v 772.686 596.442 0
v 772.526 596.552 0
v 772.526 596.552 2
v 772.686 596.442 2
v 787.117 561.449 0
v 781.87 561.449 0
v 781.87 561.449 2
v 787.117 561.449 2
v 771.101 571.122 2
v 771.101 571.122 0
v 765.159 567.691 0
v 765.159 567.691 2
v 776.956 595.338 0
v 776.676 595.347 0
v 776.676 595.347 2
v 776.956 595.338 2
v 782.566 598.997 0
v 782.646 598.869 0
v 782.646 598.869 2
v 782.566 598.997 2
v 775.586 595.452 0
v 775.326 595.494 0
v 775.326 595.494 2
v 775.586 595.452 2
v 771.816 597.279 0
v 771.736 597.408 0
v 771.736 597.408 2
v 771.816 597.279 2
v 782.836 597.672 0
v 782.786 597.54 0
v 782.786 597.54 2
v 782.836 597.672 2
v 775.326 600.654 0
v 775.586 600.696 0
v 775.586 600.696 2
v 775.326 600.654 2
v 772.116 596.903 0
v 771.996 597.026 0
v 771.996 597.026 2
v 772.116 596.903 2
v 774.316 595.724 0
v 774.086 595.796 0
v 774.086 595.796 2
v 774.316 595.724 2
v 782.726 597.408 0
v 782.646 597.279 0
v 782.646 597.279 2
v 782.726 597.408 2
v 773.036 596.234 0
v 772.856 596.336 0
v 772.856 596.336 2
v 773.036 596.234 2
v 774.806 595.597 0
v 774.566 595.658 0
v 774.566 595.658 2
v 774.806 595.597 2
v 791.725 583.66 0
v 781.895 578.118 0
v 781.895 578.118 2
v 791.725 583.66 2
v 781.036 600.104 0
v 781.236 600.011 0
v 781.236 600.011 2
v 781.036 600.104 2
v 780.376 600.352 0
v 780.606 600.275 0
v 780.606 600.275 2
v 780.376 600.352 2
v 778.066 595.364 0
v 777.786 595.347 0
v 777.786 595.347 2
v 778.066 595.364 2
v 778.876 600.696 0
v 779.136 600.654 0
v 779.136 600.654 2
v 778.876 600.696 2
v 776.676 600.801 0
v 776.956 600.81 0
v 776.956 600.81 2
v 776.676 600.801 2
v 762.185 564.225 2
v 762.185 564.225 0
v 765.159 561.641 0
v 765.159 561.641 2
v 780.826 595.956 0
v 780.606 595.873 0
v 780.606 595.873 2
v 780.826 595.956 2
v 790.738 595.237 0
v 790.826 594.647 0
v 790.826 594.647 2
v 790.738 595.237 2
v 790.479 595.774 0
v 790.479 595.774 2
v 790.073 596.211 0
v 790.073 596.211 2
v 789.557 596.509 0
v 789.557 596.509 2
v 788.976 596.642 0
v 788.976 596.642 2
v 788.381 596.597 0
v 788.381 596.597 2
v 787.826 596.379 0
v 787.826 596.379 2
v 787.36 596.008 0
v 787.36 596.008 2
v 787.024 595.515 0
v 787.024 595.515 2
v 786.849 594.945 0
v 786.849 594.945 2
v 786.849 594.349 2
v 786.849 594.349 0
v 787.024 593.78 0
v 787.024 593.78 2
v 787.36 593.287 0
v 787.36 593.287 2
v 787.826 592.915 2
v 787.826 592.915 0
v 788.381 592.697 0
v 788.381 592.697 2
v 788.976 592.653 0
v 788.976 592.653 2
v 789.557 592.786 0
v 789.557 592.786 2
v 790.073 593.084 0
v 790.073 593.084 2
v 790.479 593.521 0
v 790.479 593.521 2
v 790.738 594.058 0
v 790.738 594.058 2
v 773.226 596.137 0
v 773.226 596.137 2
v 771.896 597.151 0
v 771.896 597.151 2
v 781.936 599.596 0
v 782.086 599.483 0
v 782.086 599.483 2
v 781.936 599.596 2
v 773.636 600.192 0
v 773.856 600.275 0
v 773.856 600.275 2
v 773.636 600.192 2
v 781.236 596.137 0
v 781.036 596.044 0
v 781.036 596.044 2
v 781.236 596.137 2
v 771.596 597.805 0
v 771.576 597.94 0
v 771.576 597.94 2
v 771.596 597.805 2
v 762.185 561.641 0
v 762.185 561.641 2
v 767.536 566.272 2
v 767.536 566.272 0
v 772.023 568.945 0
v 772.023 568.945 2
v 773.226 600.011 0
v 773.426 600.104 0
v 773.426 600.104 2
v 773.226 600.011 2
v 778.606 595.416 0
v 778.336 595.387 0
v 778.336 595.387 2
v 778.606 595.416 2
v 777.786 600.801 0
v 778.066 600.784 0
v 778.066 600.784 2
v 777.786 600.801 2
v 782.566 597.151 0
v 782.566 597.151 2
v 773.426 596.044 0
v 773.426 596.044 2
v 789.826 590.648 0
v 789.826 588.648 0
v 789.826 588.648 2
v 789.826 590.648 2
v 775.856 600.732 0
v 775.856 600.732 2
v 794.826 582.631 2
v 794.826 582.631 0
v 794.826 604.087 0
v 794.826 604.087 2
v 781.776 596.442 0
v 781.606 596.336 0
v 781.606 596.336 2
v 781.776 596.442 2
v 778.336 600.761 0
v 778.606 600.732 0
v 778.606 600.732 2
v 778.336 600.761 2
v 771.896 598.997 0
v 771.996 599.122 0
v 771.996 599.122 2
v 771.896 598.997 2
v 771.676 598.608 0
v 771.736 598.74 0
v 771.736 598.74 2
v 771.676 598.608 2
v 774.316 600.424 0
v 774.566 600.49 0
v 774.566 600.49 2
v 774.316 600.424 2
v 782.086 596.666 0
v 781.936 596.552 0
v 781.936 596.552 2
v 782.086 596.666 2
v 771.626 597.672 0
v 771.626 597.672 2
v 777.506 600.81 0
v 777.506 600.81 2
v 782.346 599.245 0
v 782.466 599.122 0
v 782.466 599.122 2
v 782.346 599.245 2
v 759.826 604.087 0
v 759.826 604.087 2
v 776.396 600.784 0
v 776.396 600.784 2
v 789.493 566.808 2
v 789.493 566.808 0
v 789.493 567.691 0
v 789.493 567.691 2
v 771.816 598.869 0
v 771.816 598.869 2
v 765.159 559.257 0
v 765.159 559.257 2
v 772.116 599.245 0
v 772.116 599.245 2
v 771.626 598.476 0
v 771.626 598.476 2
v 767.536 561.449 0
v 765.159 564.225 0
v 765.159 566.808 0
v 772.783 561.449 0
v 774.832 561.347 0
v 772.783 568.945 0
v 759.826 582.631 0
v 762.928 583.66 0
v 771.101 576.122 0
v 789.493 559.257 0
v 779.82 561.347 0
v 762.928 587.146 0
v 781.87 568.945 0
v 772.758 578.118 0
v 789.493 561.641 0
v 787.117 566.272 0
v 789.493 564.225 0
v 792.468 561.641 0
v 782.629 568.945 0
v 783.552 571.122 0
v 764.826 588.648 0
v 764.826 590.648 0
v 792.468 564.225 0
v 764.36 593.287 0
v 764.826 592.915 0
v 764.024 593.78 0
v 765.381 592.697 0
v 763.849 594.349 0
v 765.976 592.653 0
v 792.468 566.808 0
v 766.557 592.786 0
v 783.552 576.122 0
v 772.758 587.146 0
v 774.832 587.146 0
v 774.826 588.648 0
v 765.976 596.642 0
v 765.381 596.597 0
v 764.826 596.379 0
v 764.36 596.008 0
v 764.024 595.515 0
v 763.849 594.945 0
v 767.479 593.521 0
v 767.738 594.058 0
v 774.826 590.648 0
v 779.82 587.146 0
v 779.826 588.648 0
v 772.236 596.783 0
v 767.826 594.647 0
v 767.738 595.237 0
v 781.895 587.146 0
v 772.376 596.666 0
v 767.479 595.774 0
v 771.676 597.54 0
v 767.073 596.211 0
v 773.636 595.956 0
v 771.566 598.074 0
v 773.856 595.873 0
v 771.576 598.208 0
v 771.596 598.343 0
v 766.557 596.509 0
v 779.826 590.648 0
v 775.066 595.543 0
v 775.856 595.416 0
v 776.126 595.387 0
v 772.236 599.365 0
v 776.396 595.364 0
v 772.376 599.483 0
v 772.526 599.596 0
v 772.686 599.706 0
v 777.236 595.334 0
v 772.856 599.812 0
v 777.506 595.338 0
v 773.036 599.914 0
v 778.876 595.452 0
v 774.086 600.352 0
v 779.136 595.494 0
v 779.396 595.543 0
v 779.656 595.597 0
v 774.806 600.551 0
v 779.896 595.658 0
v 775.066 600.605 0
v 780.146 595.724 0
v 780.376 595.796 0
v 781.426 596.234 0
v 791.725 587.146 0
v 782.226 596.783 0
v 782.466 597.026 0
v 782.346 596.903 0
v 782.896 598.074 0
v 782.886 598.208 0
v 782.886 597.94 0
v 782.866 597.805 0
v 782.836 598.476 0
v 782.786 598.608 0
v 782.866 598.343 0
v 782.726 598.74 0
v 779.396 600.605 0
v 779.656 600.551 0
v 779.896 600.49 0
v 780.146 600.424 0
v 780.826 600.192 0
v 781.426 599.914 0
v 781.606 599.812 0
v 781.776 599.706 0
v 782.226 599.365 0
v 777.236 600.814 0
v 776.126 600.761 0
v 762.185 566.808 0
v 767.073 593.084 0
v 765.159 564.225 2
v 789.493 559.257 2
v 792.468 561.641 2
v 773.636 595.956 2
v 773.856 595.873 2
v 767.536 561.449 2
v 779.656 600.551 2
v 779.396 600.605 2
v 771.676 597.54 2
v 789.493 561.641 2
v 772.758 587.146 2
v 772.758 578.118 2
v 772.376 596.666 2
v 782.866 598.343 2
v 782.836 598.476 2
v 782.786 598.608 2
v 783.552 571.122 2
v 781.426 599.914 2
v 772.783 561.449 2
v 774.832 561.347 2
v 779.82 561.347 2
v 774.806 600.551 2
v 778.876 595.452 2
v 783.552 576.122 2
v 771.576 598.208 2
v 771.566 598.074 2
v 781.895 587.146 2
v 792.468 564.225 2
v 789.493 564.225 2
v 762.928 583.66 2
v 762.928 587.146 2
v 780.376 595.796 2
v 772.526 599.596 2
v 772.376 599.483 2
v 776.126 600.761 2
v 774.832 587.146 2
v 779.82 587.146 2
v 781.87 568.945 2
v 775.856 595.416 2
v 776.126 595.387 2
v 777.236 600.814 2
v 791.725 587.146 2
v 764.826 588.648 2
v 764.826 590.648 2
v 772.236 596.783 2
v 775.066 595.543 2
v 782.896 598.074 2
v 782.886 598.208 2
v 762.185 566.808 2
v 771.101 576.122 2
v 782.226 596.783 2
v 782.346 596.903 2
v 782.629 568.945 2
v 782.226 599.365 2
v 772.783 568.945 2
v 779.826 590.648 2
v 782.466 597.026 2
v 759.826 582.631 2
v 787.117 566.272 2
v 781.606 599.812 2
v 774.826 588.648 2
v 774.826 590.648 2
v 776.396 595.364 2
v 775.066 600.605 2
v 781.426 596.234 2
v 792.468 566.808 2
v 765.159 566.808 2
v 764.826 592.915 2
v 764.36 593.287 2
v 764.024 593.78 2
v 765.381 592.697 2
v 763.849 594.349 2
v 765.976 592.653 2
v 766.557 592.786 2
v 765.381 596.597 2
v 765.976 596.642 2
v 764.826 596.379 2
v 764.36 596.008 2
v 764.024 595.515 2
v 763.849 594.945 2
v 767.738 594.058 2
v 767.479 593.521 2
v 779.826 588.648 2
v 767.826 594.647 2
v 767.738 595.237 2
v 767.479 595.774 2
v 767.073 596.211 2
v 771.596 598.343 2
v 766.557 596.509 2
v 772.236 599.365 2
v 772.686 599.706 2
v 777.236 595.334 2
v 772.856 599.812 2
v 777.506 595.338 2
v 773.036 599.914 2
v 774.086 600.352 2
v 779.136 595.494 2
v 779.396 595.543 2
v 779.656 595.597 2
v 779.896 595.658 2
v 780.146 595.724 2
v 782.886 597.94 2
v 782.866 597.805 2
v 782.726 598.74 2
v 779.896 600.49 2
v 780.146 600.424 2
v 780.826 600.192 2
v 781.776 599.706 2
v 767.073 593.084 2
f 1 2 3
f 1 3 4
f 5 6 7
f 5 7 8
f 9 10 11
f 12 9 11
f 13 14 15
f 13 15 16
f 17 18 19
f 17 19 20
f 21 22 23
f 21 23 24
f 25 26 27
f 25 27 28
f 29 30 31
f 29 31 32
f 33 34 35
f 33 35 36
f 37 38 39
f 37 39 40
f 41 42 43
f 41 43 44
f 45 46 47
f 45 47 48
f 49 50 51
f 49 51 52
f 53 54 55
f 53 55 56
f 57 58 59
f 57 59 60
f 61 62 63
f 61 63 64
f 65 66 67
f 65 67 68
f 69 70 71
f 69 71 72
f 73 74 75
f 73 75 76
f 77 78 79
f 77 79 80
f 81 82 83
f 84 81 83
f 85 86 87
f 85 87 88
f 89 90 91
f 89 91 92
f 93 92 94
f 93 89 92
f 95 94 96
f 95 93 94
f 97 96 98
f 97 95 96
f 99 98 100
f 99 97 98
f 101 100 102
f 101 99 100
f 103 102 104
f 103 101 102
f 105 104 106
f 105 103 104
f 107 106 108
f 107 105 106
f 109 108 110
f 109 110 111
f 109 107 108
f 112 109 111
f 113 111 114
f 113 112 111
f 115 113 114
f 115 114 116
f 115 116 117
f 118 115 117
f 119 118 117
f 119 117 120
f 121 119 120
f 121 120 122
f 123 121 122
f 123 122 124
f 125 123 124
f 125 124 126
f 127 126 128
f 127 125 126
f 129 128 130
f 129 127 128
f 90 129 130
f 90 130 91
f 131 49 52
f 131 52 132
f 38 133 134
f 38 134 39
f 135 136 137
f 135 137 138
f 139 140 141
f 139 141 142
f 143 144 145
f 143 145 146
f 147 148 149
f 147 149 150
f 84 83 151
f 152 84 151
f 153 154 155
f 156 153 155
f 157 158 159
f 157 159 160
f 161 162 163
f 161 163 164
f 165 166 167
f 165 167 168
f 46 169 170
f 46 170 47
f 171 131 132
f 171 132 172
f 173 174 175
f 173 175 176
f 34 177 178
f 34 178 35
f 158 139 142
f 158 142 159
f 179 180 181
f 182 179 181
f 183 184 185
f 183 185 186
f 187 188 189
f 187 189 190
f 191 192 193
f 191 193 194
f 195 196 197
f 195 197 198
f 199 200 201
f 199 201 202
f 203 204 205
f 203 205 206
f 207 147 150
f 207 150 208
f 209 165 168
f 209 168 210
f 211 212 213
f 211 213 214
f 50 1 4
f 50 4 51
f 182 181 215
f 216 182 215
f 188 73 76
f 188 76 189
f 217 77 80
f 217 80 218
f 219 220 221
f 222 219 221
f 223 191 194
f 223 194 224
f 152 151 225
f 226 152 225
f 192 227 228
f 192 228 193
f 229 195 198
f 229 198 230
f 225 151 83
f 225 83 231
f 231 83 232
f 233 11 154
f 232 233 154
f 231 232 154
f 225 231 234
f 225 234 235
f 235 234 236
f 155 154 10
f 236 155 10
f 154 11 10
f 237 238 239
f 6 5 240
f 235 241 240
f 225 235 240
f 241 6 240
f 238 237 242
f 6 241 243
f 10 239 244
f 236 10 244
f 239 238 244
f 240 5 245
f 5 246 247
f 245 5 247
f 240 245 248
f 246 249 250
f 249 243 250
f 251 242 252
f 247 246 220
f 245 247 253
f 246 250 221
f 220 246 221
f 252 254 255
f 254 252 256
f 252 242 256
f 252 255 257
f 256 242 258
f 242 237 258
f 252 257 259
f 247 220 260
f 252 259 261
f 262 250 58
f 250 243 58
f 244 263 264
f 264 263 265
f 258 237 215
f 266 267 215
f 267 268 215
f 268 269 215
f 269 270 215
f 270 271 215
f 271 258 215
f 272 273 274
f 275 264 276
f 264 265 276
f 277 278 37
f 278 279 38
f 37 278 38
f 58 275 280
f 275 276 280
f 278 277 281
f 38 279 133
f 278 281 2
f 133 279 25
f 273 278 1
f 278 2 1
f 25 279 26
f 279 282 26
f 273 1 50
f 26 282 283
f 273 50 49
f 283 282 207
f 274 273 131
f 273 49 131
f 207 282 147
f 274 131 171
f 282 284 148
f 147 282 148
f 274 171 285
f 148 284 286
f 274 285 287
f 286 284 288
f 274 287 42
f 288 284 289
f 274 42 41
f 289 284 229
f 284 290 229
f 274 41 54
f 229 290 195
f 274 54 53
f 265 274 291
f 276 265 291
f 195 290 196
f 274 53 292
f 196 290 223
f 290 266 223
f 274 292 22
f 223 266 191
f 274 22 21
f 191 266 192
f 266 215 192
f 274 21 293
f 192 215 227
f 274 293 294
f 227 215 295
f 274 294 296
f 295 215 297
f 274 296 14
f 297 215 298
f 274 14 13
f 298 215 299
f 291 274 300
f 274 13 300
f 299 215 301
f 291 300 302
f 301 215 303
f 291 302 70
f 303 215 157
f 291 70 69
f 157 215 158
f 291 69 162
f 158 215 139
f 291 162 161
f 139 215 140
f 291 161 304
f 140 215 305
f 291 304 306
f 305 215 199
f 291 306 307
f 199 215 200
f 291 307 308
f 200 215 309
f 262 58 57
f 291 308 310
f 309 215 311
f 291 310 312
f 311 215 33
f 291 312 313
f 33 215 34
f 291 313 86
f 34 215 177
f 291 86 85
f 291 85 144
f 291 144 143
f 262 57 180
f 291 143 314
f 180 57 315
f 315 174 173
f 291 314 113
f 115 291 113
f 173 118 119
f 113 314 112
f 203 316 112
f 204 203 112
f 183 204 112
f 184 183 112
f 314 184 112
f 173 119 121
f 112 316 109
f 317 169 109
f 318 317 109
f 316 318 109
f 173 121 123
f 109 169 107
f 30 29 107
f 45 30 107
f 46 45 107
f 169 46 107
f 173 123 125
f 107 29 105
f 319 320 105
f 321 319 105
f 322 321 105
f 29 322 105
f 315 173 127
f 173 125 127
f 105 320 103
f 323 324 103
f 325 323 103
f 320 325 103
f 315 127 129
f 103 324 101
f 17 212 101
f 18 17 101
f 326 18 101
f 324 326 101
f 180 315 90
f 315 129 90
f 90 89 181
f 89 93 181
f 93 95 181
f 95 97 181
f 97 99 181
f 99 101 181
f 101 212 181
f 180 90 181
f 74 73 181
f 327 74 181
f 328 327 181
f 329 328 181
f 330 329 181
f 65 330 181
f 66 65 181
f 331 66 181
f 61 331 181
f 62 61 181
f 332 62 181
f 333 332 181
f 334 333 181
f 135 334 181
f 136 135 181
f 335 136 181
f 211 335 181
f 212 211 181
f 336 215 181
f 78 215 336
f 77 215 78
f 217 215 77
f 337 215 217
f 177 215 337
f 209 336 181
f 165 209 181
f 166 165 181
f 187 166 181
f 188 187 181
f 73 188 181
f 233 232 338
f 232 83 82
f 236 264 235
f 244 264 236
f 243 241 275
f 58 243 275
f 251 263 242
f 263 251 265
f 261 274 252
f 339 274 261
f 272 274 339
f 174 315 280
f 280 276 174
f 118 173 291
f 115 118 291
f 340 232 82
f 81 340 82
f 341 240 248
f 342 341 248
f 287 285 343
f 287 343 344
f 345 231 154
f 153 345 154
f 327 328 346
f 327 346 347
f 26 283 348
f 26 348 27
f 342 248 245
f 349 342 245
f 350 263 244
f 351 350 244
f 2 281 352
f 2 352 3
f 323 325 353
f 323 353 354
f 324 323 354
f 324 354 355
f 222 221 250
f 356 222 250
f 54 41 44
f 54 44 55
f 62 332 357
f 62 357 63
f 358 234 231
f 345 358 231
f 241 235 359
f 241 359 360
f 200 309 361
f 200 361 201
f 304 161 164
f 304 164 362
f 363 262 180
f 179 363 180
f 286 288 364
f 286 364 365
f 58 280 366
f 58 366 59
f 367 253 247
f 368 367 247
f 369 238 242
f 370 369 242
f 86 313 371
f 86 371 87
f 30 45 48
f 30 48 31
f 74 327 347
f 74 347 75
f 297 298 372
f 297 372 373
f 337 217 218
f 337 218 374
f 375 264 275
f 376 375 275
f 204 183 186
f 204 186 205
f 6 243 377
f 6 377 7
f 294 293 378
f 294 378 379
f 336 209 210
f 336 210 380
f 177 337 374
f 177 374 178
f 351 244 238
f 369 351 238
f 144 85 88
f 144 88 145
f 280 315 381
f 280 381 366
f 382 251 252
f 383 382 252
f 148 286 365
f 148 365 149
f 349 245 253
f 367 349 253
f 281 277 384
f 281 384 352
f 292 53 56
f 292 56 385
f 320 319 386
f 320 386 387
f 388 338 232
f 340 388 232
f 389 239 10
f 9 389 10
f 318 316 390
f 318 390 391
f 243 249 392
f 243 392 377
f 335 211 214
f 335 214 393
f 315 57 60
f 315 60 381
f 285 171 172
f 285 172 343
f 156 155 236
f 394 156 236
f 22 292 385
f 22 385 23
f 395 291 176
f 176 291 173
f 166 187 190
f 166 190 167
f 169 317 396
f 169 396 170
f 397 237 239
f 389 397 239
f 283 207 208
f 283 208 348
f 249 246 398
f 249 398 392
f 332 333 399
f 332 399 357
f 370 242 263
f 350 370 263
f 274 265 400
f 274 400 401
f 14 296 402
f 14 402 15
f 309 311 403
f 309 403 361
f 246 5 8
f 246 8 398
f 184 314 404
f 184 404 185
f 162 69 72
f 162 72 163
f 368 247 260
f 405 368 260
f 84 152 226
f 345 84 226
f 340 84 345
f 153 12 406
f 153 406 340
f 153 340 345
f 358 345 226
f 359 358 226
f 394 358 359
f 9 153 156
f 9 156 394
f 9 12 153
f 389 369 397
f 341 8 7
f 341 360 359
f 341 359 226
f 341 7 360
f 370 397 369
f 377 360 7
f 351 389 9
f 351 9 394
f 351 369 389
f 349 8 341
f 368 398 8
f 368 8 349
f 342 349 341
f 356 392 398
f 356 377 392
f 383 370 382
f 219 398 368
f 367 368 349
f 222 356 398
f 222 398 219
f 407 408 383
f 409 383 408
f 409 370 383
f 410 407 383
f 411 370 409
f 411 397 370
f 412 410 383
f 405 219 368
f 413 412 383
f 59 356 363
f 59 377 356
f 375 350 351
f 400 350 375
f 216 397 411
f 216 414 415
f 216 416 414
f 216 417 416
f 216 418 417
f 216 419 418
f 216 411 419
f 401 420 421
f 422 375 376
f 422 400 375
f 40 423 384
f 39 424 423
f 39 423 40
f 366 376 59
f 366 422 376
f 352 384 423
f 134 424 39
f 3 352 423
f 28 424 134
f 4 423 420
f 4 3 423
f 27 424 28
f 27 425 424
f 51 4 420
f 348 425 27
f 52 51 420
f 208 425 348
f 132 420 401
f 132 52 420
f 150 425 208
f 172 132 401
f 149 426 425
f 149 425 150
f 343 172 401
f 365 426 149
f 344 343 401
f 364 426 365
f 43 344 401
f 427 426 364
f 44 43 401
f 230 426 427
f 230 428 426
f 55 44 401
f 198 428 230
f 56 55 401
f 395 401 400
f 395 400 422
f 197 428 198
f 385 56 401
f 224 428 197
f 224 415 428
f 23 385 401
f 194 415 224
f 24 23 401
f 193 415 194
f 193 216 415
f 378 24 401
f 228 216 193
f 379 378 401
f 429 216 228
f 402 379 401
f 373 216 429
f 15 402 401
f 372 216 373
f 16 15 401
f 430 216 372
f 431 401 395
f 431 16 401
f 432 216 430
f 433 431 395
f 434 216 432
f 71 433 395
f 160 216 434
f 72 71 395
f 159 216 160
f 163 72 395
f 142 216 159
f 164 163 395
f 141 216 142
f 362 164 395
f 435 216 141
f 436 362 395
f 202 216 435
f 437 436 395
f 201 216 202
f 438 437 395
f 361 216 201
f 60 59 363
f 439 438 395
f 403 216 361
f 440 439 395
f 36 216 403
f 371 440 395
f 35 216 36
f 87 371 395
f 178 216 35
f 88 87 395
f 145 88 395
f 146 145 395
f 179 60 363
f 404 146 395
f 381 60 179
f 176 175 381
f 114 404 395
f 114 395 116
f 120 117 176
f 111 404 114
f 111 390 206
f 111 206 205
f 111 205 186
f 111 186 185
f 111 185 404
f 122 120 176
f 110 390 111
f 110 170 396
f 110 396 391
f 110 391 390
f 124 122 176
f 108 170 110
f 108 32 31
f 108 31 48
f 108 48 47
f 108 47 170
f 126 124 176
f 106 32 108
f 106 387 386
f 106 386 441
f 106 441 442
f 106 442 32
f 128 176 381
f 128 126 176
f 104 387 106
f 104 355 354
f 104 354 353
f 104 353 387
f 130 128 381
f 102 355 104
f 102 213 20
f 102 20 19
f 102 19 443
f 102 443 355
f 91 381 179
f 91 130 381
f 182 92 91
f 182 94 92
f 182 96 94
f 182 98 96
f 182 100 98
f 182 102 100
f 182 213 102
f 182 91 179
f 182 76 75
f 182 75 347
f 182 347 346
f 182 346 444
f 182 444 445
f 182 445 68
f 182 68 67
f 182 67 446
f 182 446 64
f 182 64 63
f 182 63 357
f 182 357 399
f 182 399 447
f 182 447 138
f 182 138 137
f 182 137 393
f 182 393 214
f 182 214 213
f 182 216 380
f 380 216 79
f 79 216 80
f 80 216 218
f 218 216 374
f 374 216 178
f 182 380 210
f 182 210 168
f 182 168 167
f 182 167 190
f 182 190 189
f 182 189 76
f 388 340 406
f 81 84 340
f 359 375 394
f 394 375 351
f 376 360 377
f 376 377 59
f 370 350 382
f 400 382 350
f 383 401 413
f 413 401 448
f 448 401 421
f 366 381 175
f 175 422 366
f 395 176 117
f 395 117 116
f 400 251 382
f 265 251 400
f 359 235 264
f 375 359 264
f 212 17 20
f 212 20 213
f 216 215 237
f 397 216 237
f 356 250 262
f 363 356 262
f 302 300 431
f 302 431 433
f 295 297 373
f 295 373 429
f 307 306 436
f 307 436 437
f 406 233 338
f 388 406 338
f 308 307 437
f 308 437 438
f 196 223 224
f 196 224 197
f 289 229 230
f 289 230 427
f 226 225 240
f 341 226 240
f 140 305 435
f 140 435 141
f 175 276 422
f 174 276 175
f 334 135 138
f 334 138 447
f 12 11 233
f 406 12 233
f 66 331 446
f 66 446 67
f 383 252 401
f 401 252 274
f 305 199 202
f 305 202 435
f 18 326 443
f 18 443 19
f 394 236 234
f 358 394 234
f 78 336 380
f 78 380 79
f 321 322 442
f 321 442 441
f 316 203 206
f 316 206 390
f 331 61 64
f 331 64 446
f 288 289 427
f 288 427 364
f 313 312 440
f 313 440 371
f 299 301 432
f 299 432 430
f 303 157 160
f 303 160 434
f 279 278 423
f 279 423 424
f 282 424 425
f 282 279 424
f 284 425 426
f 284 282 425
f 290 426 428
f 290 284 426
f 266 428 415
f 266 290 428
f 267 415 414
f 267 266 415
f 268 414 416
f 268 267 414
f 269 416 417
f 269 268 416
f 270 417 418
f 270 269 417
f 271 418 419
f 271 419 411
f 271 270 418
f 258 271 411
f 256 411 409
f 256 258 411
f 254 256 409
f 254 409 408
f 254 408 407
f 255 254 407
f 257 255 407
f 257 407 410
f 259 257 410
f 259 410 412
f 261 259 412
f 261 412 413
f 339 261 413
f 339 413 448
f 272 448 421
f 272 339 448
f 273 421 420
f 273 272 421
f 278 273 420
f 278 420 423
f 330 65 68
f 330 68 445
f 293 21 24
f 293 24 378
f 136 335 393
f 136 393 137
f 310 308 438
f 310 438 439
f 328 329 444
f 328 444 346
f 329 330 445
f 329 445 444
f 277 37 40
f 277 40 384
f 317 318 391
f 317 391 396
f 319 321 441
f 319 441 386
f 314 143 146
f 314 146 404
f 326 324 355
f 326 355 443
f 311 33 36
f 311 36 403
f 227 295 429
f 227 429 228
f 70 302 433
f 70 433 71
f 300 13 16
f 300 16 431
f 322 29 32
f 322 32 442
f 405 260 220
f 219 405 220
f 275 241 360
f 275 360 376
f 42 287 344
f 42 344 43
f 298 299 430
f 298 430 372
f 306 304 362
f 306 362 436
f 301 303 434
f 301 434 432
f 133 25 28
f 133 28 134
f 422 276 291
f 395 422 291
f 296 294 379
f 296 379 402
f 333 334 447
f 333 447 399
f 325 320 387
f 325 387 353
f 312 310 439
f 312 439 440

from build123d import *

# Parameters (mm, degrees)
MODEL_R         = 2
MODEL_W         = 10
MODEL_H         = 2
MODEL_W_2       = 4.987831099
MODEL_H_2       = 25.799348384
EXTRUDE_1_DEPTH = 2


with BuildPart() as part:
    # Model → 凸台-拉伸1 (new body)
    with BuildSketch(Plane.XY):
        Polygon((794.826364885, 604.086609439), (759.826364885, 604.086609439), (759.826364885, 582.631162925), (771.100956458, 576.121774445), (771.100956458, 571.121774445), (765.159330178, 567.691374913), (765.159330178, 566.808009524), (762.184594735, 566.808009524), (765.159330178, 564.224720814), (762.184594735, 564.224720814), (765.159330178, 561.641432105), (762.184594735, 561.641432105), (765.159330178, 559.256659904), (789.493399591, 559.256659904), (792.468135034, 561.641432105), (789.493399591, 561.641432105), (792.468135034, 564.224720814), (789.493399591, 564.224720814), (792.468135034, 566.808009524), (789.493399591, 566.808009524), (789.493399591, 567.691374913), (783.551773312, 571.121774445), (783.551773312, 576.121774445), (794.826364885, 582.631162925), align=None)
        with Locations((765.826364885, 594.647306527)):
            Circle(MODEL_R, mode=Mode.SUBTRACT)
        with Locations((788.826364885, 594.647306527)):
            Circle(MODEL_R, mode=Mode.SUBTRACT)
        with Locations((784.826364885, 589.647718545)):
            Rectangle(MODEL_W, MODEL_H, mode=Mode.SUBTRACT)
        with Locations((769.826364885, 589.647718545)):
            Rectangle(MODEL_W, MODEL_H, mode=Mode.SUBTRACT)
        Polygon((791.725011171, 587.146217285), (781.894706262, 587.146217285), (781.894706262, 578.118128773), (791.725011171, 583.659501515), align=None, mode=Mode.SUBTRACT)
        with Locations((777.326364885, 574.246543093)):
            Rectangle(MODEL_W_2, MODEL_H_2, mode=Mode.SUBTRACT)
        Polygon((787.11688102, 566.27157462), (782.629496351, 568.945406022), (781.869533608, 568.945406022), (781.869533608, 561.448894487), (787.11688102, 561.448894487), align=None, mode=Mode.SUBTRACT)
        Polygon((762.927718599, 587.146217285), (772.758023508, 587.146217285), (772.758023508, 578.118128773), (762.927718599, 583.659501515), align=None, mode=Mode.SUBTRACT)
        Polygon((767.53584875, 566.27157462), (772.023233419, 568.945406022), (772.783196161, 568.945406022), (772.783196161, 561.448894487), (767.53584875, 561.448894487), align=None, mode=Mode.SUBTRACT)
        Polygon((782.896259254, 598.074237023), (782.886259254, 598.208237023), (782.866259254, 598.343237023), (782.836259254, 598.476237023), (782.786259254, 598.608237023), (782.726259254, 598.740237023), (782.646259254, 598.869237023), (782.566259254, 598.997237023), (782.466259254, 599.122237023), (782.346259254, 599.245237023), (782.226259254, 599.365237023), (782.086259254, 599.483237023), (781.936259254, 599.596237023), (781.776259254, 599.706237023), (781.606259254, 599.812237023), (781.426259254, 599.914237023), (781.236259254, 600.011237023), (781.036259254, 600.104237023), (780.826259254, 600.192237023), (780.606259254, 600.275237023), (780.376259254, 600.352237023), (780.146259254, 600.424237023), (779.896259254, 600.490237023), (779.656259254, 600.551237023), (779.396259254, 600.605237023), (779.136259254, 600.654237023), (778.876259254, 600.696237023), (778.606259254, 600.732237023), (778.336259254, 600.761237023), (778.066259254, 600.784237023), (777.786259254, 600.801237023), (777.506259254, 600.810237023), (777.236259254, 600.814237023), (776.956259254, 600.810237023), (776.676259254, 600.801237023), (776.396259254, 600.784237023), (776.126259254, 600.761237023), (775.856259254, 600.732237023), (775.586259254, 600.696237023), (775.326259254, 600.654237023), (775.066259254, 600.605237023), (774.806259254, 600.551237023), (774.566259254, 600.490237023), (774.316259254, 600.424237023), (774.086259254, 600.352237023), (773.856259254, 600.275237023), (773.636259254, 600.192237023), (773.426259254, 600.104237023), (773.226259254, 600.011237023), (773.036259254, 599.914237023), (772.856259254, 599.812237023), (772.686259254, 599.706237023), (772.526259254, 599.596237023), (772.376259254, 599.483237023), (772.236259254, 599.365237023), (772.116259254, 599.245237023), (771.996259254, 599.122237023), (771.896259254, 598.997237023), (771.816259254, 598.869237023), (771.736259254, 598.740237023), (771.676259254, 598.608237023), (771.626259254, 598.476237023), (771.596259254, 598.343237023), (771.576259254, 598.208237023), (771.566259254, 598.074237023), (771.576259254, 597.940237023), (771.596259254, 597.805237023), (771.626259254, 597.672237023), (771.676259254, 597.540237023), (771.736259254, 597.408237023), (771.816259254, 597.279237023), (771.896259254, 597.151237023), (771.996259254, 597.026237023), (772.116259254, 596.903237023), (772.236259254, 596.783237023), (772.376259254, 596.666237023), (772.526259254, 596.552237023), (772.686259254, 596.442237023), (772.856259254, 596.336237023), (773.036259254, 596.234237023), (773.226259254, 596.137237023), (773.426259254, 596.044237023), (773.636259254, 595.956237023), (773.856259254, 595.873237023), (774.086259254, 595.796237023), (774.316259254, 595.724237023), (774.566259254, 595.658237023), (774.806259254, 595.597237023), (775.066259254, 595.543237023), (775.326259254, 595.494237023), (775.586259254, 595.452237023), (775.856259254, 595.416237023), (776.126259254, 595.387237023), (776.396259254, 595.364237023), (776.676259254, 595.347237023), (776.956259254, 595.338237023), (777.236259254, 595.334237023), (777.506259254, 595.338237023), (777.786259254, 595.347237023), (778.066259254, 595.364237023), (778.336259254, 595.387237023), (778.606259254, 595.416237023), (778.876259254, 595.452237023), (779.136259254, 595.494237023), (779.396259254, 595.543237023), (779.656259254, 595.597237023), (779.896259254, 595.658237023), (780.146259254, 595.724237023), (780.376259254, 595.796237023), (780.606259254, 595.873237023), (780.826259254, 595.956237023), (781.036259254, 596.044237023), (781.236259254, 596.137237023), (781.426259254, 596.234237023), (781.606259254, 596.336237023), (781.776259254, 596.442237023), (781.936259254, 596.552237023), (782.086259254, 596.666237023), (782.226259254, 596.783237023), (782.346259254, 596.903237023), (782.466259254, 597.026237023), (782.566259254, 597.151237023), (782.646259254, 597.279237023), (782.726259254, 597.408237023), (782.786259254, 597.540237023), (782.836259254, 597.672237023), (782.866259254, 597.805237023), (782.886259254, 597.940237023), align=None, mode=Mode.SUBTRACT)
    extrude(amount=EXTRUDE_1_DEPTH)


solid = part.part
